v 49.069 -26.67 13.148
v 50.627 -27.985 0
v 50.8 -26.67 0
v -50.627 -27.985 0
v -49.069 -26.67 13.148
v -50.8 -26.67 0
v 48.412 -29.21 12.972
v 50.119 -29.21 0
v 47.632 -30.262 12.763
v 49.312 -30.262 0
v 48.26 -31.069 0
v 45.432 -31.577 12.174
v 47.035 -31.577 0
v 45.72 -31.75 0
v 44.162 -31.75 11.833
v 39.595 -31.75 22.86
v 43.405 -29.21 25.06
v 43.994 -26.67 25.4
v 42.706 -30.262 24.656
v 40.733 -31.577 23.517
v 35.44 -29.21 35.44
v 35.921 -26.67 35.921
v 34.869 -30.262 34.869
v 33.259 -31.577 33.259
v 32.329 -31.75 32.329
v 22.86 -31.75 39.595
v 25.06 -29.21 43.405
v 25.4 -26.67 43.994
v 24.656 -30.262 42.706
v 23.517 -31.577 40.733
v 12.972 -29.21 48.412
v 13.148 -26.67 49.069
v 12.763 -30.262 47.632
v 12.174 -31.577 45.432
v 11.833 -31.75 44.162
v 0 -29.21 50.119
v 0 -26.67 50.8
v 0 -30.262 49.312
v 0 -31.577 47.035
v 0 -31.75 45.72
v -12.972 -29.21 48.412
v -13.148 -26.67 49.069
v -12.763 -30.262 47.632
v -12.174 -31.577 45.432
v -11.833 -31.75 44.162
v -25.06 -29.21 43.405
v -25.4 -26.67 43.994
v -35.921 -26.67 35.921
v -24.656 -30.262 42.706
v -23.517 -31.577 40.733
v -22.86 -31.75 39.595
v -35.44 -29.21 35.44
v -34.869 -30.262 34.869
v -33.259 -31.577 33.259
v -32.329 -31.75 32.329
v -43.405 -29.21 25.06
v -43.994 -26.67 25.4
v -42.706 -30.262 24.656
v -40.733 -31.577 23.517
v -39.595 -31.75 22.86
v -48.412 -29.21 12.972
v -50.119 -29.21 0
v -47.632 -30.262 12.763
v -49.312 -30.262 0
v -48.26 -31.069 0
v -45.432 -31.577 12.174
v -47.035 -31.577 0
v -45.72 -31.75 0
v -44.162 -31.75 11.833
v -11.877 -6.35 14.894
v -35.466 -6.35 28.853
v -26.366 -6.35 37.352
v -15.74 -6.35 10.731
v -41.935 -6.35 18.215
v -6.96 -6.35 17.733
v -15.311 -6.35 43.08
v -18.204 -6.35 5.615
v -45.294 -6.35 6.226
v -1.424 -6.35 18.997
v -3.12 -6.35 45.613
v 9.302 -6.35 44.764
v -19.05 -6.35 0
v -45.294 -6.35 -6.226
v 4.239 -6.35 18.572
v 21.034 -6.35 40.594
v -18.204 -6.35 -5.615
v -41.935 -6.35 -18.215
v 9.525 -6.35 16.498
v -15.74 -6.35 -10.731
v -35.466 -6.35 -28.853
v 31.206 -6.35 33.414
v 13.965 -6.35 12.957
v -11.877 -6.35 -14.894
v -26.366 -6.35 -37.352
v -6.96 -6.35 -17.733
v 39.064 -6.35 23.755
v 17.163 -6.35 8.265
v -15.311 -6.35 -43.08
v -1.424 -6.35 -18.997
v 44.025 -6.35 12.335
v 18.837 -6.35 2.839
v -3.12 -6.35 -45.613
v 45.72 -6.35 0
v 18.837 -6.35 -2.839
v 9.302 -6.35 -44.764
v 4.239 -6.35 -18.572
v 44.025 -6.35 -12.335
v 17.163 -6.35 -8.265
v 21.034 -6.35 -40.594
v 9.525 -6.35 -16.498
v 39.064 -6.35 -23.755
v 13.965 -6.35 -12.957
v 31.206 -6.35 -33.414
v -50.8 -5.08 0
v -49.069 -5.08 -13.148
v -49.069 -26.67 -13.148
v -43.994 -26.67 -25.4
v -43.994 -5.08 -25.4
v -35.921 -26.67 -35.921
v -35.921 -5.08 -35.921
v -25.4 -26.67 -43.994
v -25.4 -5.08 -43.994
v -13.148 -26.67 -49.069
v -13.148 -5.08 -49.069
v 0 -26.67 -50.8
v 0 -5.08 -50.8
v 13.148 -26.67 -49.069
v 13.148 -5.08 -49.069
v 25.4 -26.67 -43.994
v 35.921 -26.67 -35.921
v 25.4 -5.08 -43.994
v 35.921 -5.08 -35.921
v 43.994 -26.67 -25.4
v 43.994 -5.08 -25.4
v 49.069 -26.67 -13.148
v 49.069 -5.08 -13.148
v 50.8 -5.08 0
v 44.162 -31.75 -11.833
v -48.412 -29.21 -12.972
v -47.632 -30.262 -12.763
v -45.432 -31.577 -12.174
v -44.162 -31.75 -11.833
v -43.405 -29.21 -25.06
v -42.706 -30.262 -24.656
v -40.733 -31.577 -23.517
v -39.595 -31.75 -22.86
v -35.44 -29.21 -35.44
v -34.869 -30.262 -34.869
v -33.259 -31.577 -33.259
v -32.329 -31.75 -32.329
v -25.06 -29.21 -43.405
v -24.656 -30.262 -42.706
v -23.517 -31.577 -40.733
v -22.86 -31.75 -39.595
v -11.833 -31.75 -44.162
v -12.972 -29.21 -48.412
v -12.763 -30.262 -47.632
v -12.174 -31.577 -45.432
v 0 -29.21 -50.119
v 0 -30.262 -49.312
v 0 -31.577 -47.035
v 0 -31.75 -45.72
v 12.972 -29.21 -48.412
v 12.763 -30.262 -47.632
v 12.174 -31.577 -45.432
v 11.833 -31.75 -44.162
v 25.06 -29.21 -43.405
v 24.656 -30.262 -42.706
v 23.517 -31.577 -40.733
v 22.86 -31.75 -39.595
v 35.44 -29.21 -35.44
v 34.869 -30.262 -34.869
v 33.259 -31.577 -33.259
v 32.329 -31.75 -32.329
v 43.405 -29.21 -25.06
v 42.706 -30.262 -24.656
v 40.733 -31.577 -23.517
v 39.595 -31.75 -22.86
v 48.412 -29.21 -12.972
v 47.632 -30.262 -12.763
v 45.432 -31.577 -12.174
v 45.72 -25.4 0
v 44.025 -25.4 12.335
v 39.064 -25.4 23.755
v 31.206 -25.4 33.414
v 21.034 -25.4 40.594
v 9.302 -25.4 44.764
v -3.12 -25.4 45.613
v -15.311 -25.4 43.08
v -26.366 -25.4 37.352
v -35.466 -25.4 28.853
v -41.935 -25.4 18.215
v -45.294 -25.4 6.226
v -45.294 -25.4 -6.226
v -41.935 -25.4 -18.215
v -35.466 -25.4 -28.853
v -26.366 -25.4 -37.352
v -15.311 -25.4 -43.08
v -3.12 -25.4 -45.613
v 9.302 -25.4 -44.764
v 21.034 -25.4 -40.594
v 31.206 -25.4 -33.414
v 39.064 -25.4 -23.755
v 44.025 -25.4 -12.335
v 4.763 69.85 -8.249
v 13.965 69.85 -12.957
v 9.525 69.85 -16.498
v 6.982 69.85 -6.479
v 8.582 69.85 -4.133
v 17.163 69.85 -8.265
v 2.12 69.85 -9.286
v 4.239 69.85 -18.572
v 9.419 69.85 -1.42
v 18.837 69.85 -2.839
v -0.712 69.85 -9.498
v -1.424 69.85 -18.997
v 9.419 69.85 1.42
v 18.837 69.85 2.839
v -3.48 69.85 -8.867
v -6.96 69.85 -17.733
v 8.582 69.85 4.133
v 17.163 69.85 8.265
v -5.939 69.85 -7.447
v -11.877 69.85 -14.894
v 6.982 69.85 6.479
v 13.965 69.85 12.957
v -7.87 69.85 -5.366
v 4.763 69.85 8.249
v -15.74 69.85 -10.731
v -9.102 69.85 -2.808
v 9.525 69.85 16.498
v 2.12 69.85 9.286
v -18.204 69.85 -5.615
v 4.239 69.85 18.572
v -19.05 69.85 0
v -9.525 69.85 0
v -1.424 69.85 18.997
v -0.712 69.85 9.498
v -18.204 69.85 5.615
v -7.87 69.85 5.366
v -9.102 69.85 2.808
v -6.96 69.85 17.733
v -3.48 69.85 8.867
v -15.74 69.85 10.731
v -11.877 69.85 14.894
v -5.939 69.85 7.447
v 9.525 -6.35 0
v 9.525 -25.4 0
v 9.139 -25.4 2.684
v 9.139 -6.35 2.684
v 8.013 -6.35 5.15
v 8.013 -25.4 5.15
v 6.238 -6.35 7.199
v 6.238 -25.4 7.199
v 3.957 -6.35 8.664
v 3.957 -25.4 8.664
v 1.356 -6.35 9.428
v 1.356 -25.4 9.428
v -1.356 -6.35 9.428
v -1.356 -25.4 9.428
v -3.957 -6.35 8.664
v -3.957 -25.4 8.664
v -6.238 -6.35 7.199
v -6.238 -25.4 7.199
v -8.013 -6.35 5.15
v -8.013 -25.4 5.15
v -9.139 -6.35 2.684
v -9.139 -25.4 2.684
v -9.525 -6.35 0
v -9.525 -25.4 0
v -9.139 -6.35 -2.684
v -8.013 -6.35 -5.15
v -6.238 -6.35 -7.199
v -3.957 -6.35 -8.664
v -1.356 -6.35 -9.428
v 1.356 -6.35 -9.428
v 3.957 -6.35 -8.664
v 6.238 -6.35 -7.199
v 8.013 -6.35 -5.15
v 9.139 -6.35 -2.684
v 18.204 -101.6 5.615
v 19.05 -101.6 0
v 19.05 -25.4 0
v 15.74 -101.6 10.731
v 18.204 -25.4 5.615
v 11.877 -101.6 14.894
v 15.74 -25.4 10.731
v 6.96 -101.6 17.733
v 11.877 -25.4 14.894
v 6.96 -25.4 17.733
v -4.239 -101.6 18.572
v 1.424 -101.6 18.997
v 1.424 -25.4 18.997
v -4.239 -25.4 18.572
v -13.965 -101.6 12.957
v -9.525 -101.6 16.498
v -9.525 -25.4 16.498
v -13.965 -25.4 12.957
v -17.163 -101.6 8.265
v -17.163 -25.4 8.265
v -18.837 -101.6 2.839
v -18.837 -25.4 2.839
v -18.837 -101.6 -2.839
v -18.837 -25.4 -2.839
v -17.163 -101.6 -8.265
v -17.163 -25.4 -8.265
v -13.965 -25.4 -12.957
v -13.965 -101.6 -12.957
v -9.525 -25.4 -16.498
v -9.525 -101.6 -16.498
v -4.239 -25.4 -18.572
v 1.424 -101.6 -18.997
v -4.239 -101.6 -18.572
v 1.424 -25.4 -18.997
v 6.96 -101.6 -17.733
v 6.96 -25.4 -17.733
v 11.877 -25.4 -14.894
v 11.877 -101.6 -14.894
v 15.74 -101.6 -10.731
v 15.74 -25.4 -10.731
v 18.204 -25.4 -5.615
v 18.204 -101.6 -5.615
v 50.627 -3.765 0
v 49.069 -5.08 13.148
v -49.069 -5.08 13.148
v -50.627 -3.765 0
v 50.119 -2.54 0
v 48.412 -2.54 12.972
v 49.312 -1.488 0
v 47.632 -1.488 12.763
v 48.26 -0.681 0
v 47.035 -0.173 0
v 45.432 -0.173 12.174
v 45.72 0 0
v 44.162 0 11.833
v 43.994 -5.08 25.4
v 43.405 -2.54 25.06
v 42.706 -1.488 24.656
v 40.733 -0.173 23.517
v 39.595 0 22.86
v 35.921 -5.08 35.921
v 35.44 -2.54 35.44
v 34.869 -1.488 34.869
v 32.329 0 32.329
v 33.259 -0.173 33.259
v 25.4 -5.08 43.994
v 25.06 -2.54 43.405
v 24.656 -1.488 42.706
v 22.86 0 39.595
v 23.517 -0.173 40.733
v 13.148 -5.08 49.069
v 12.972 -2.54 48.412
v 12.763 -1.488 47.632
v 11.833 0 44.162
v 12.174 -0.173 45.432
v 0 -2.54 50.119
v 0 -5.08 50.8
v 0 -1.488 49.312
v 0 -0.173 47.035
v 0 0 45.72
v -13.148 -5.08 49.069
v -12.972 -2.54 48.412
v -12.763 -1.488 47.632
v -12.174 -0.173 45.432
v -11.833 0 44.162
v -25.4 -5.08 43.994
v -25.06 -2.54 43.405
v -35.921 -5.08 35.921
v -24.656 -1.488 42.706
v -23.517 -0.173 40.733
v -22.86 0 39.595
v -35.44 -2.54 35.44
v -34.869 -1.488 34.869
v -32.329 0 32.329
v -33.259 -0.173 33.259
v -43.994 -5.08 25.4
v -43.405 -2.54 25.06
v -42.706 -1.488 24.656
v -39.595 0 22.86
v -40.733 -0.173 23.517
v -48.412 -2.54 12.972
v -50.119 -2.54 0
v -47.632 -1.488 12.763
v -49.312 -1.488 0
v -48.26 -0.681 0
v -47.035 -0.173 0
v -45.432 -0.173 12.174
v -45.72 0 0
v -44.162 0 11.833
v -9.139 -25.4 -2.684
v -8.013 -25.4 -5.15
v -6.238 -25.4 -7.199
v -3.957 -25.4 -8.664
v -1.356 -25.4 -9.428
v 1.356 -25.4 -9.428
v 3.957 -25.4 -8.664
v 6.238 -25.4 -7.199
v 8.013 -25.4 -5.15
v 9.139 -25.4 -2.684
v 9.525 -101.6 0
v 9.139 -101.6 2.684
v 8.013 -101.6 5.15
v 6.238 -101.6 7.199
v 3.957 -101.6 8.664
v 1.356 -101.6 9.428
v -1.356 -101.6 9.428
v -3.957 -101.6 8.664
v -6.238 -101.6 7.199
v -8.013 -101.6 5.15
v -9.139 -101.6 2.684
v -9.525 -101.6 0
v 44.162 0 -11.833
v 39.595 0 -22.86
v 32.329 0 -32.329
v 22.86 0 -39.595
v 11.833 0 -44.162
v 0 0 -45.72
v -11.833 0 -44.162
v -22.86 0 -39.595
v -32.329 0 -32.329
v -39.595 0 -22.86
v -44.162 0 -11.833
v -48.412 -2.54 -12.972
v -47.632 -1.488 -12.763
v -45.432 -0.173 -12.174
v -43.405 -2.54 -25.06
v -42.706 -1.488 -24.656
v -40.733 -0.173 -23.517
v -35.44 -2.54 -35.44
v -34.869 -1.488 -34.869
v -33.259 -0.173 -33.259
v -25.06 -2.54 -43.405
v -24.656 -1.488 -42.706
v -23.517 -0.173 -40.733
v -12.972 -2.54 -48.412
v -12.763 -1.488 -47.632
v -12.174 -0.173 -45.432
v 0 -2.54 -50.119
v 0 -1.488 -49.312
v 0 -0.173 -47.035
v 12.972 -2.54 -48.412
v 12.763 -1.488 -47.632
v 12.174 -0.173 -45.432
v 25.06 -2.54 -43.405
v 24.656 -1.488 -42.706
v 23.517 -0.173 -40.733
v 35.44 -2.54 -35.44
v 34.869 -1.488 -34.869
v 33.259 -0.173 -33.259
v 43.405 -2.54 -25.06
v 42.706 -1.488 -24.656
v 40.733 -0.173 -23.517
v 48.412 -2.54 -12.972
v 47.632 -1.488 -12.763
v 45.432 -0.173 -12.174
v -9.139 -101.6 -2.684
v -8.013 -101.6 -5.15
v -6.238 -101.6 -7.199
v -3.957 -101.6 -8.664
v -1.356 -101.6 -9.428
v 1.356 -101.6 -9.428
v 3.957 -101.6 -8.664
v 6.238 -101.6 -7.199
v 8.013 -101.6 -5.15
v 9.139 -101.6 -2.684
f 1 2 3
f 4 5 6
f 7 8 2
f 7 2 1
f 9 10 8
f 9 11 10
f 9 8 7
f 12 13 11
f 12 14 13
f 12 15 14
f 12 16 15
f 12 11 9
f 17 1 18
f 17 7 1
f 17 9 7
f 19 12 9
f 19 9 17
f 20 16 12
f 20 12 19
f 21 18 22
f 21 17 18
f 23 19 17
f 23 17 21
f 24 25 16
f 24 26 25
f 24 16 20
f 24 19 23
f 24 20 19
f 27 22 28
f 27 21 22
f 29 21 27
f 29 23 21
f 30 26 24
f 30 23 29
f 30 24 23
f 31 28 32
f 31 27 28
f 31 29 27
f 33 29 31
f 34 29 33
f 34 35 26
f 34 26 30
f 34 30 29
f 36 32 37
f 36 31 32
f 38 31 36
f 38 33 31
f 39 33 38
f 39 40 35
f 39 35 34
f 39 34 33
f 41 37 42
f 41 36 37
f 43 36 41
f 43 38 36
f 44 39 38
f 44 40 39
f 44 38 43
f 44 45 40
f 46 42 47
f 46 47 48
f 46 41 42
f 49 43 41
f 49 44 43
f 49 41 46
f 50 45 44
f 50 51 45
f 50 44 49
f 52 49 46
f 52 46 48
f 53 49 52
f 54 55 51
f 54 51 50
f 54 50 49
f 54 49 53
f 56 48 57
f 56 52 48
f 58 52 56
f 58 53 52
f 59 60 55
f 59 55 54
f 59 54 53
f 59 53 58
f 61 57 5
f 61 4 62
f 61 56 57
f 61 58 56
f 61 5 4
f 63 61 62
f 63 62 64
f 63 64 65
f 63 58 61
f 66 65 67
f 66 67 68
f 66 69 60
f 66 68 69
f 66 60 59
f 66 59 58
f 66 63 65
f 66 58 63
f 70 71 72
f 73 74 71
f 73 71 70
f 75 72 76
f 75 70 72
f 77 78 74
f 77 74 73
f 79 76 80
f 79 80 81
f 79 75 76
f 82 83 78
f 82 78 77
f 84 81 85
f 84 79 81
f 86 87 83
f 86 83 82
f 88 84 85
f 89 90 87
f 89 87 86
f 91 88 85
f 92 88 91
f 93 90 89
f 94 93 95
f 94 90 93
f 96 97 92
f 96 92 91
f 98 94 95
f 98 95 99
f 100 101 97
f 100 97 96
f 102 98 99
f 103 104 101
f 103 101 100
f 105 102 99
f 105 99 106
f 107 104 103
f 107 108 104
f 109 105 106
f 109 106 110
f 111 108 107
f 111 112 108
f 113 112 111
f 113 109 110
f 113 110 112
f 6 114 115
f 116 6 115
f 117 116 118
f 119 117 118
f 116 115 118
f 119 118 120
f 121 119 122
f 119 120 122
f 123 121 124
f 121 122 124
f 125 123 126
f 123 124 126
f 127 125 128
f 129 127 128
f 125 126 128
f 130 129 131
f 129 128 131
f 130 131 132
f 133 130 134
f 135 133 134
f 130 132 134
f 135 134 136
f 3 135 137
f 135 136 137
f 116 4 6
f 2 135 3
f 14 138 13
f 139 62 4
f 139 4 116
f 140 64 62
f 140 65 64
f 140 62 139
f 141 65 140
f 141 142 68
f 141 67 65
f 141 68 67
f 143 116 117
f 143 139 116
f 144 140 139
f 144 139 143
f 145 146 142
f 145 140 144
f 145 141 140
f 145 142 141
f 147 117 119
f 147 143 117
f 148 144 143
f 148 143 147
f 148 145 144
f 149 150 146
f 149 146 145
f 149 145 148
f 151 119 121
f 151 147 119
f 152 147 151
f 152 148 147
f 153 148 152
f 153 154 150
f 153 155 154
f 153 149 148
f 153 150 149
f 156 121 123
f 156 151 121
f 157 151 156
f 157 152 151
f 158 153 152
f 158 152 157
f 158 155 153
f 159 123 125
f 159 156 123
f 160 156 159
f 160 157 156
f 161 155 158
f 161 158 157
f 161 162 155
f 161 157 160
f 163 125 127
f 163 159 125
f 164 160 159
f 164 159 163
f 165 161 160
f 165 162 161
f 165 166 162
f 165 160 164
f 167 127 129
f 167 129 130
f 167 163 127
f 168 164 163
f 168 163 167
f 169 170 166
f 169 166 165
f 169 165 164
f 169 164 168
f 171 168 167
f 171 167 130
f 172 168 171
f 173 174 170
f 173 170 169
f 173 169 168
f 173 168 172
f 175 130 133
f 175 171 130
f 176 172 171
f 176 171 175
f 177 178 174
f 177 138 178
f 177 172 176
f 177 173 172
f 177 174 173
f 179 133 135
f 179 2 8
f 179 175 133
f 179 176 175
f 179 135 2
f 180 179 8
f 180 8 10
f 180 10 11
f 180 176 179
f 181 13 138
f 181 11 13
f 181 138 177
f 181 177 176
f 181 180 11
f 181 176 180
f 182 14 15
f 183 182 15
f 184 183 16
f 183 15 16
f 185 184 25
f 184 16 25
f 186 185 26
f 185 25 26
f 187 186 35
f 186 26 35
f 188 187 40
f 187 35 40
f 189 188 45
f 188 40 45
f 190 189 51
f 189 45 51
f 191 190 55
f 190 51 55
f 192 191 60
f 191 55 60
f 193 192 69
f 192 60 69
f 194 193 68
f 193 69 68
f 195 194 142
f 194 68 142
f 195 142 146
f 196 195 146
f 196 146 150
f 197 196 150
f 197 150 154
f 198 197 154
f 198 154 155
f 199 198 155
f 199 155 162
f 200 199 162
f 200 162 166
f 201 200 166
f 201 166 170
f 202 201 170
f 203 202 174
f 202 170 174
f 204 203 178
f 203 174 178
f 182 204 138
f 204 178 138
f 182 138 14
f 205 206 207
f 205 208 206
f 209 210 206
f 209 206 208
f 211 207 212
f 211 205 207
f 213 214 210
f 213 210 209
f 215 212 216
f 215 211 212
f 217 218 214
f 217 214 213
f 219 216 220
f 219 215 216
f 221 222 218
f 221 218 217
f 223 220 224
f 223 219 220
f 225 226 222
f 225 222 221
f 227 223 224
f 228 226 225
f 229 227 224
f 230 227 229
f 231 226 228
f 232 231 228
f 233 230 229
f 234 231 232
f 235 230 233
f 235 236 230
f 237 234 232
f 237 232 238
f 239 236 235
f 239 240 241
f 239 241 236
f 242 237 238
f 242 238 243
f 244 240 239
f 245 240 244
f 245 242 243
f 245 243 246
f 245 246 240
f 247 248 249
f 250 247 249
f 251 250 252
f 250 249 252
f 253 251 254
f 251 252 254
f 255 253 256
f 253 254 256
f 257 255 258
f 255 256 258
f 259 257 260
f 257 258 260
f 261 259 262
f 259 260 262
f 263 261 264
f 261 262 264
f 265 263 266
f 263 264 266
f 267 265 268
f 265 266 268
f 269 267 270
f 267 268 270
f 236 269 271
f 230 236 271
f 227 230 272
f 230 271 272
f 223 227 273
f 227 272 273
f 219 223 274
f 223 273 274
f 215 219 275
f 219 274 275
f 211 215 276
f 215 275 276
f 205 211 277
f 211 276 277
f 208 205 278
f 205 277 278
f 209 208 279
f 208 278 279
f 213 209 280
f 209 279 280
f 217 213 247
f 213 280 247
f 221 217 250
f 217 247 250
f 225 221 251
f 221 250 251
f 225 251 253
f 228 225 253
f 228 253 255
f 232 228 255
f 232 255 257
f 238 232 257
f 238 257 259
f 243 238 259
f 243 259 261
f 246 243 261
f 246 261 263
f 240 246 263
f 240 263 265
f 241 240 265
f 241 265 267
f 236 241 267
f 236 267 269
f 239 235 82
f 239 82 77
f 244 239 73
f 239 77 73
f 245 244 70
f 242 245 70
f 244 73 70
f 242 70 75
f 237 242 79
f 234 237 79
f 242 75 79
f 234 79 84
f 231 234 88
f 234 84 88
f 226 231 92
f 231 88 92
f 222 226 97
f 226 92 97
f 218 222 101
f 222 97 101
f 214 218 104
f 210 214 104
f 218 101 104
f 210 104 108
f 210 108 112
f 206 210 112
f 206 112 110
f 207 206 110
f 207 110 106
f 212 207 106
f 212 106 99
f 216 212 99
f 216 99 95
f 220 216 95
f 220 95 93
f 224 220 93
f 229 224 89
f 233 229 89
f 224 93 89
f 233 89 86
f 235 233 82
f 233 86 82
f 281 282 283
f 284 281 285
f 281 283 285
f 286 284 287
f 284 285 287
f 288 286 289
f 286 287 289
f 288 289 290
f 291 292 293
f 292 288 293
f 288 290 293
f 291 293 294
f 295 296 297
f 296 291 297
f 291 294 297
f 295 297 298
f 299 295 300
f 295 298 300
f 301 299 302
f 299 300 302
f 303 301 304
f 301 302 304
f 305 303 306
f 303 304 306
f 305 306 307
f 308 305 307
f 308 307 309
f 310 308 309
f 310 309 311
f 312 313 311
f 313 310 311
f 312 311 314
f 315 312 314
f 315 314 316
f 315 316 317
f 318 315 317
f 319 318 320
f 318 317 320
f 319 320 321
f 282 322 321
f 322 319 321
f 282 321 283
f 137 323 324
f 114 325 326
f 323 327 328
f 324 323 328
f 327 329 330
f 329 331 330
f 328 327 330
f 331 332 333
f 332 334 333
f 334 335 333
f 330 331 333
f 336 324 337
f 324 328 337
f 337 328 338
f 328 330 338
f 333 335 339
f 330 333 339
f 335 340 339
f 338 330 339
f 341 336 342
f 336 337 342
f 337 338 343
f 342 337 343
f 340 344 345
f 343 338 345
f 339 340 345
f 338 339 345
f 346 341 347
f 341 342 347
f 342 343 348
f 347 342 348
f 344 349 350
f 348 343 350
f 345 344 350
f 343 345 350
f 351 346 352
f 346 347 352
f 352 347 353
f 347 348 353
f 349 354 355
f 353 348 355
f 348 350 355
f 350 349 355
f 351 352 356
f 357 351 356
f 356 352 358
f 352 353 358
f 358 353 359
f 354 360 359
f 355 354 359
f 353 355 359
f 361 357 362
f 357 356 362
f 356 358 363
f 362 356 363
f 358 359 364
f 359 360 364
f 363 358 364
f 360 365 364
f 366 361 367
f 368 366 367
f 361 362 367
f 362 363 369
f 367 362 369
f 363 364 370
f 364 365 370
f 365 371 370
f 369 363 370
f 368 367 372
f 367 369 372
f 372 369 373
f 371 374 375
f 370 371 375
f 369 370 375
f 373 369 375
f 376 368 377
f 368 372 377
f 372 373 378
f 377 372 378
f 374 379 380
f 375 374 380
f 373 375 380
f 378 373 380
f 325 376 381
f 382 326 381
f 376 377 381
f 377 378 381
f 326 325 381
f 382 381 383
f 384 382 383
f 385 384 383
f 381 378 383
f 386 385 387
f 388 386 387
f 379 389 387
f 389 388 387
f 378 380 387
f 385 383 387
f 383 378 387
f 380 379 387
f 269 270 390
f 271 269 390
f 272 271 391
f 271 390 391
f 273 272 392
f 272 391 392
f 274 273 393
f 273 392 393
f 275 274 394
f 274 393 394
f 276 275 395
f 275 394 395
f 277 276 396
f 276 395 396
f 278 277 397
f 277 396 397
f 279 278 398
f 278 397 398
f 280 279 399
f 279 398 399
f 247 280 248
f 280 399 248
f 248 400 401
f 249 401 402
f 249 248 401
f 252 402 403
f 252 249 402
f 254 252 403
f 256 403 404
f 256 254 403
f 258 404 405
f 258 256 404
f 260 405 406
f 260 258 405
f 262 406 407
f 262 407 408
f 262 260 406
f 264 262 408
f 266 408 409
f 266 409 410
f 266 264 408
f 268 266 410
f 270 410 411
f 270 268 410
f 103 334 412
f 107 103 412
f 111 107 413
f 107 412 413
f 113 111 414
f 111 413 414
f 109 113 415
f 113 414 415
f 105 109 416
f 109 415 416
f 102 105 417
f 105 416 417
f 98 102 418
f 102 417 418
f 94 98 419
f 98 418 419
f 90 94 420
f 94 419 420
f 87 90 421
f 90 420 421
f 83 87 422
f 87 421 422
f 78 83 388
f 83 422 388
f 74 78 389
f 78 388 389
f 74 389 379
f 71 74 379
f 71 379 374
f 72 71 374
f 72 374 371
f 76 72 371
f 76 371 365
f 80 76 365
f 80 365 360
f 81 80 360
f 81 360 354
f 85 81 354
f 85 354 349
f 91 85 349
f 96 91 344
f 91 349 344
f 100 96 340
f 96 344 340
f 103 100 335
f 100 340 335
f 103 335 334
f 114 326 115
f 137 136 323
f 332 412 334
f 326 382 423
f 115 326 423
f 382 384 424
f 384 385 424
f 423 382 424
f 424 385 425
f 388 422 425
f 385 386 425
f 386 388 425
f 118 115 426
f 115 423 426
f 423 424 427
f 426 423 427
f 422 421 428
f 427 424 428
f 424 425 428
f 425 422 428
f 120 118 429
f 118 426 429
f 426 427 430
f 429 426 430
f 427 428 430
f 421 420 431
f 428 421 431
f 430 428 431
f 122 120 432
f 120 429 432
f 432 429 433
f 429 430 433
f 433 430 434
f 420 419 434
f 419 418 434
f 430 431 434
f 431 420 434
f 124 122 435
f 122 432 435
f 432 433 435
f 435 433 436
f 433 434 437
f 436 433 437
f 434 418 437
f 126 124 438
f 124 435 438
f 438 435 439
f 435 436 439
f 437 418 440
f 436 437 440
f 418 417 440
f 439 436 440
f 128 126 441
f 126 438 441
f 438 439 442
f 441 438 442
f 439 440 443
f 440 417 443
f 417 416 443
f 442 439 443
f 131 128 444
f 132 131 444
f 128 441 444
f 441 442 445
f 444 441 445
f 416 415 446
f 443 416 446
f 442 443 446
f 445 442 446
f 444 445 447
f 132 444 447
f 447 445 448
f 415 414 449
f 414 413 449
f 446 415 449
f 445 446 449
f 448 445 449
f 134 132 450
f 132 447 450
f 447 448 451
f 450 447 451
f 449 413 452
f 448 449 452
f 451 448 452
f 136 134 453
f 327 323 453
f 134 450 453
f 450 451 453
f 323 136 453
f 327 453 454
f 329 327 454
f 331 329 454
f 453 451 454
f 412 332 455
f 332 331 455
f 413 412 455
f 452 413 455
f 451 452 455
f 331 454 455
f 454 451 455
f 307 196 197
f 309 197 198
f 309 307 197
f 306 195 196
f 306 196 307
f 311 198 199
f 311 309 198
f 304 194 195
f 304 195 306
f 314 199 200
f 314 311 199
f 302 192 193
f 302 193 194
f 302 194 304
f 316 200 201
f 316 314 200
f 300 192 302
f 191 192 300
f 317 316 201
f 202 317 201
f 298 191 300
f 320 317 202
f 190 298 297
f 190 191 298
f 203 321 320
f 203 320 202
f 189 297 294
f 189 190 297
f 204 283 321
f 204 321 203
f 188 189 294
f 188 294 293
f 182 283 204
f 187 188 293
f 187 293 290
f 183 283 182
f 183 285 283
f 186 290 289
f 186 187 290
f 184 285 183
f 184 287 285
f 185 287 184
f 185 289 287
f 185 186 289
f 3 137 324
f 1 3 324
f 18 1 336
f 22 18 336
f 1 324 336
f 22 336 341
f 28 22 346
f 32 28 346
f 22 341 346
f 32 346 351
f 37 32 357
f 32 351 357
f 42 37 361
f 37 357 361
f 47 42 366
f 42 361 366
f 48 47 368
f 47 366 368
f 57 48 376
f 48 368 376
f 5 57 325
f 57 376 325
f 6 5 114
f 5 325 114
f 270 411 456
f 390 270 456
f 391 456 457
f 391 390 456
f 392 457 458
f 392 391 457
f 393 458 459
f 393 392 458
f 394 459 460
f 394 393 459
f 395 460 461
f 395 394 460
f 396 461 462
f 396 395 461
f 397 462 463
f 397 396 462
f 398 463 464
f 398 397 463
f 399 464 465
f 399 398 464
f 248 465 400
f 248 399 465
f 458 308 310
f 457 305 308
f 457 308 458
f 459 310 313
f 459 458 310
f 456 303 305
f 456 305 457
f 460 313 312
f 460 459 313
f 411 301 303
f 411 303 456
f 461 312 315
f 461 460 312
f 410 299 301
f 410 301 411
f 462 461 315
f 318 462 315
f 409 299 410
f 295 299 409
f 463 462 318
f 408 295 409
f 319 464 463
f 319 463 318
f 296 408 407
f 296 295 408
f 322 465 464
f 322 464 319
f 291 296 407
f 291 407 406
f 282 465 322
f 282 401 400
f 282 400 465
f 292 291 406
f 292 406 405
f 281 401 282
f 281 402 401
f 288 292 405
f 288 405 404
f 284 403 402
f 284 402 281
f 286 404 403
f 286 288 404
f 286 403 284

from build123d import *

# Parameters (mm, degrees)
F0_R         = 50.8
F1_DEPTH     = 31.75
F2_R         = 5.08
F3_R         = 9.525
F4_DEPTH     = 31.751
F1_FACE_R    = 45.72
F1_FACE_R_2  = 9.525
F5_DEPTH     = 6.35
F1_FACE1_R   = 45.72
F1_FACE1_R_2 = 9.525
F6_DEPTH     = 6.35
F7_R         = 19.05
F7_R_2       = 9.525
F8_DEPTH     = 76.2
F10_R        = 19.05
F11_DEPTH    = 76.2


with BuildPart() as f1:
    # F0 (on Front) → F1 (new body)
    with BuildSketch(Plane.XZ):
        Circle(F0_R)
    extrude(amount=F1_DEPTH)

    # F2
    f2_edges = [f1.edges().sort_by_distance(p)[0] for p in [
        (-50.8, -31.75, 0),
        (-50.8, 0, 0),
    ]]
    fillet(f2_edges, radius=F2_R)

    # F3 (on face) → F4 (cut, through all)
    with BuildSketch(Plane.XZ.offset(31.75)):
        Circle(F3_R)
    extrude(amount=-F4_DEPTH, mode=Mode.SUBTRACT)

    # F1_face (on face) → F5 (cut)
    with BuildSketch(Plane.XZ.offset(31.75)):
        Circle(F1_FACE_R)
        Circle(F1_FACE_R_2, mode=Mode.SUBTRACT)
    extrude(amount=-F5_DEPTH, mode=Mode.SUBTRACT)

    # F1_face1 (on face) → F6 (cut)
    with BuildSketch(Plane(origin=(0, 0, 0), x_dir=(1, 0, 0), z_dir=(0, 1, 0))):
        Circle(F1_FACE1_R)
        Circle(F1_FACE1_R_2, mode=Mode.SUBTRACT)
    extrude(amount=-F6_DEPTH, mode=Mode.SUBTRACT)

    # F7 (on face) → F8 (join)
    with BuildSketch(Plane.XZ.offset(25.4)):
        Circle(F7_R)
        Circle(F7_R_2, mode=Mode.SUBTRACT)
    extrude(amount=F8_DEPTH)

    # F9: F1 across plane


with BuildPart() as f1_1:
    add(f1.part)
    add(f1.part.mirror(Plane.YZ))

    # F10 (on face) → F11 (join)
    with BuildSketch(Plane(origin=(0, -6.35, 0), x_dir=(-1, 0, 0), z_dir=(0, 1, 0))):
        Circle(F10_R)
        with BuildLine():
            ThreePointArc((-9.525, 0), (0, 9.525), (9.525, 0))
            ThreePointArc((9.525, 0), (0, -9.525), (-9.525, 0))
        make_face(mode=Mode.SUBTRACT)
    extrude(amount=F11_DEPTH)


solid = f1_1.part
